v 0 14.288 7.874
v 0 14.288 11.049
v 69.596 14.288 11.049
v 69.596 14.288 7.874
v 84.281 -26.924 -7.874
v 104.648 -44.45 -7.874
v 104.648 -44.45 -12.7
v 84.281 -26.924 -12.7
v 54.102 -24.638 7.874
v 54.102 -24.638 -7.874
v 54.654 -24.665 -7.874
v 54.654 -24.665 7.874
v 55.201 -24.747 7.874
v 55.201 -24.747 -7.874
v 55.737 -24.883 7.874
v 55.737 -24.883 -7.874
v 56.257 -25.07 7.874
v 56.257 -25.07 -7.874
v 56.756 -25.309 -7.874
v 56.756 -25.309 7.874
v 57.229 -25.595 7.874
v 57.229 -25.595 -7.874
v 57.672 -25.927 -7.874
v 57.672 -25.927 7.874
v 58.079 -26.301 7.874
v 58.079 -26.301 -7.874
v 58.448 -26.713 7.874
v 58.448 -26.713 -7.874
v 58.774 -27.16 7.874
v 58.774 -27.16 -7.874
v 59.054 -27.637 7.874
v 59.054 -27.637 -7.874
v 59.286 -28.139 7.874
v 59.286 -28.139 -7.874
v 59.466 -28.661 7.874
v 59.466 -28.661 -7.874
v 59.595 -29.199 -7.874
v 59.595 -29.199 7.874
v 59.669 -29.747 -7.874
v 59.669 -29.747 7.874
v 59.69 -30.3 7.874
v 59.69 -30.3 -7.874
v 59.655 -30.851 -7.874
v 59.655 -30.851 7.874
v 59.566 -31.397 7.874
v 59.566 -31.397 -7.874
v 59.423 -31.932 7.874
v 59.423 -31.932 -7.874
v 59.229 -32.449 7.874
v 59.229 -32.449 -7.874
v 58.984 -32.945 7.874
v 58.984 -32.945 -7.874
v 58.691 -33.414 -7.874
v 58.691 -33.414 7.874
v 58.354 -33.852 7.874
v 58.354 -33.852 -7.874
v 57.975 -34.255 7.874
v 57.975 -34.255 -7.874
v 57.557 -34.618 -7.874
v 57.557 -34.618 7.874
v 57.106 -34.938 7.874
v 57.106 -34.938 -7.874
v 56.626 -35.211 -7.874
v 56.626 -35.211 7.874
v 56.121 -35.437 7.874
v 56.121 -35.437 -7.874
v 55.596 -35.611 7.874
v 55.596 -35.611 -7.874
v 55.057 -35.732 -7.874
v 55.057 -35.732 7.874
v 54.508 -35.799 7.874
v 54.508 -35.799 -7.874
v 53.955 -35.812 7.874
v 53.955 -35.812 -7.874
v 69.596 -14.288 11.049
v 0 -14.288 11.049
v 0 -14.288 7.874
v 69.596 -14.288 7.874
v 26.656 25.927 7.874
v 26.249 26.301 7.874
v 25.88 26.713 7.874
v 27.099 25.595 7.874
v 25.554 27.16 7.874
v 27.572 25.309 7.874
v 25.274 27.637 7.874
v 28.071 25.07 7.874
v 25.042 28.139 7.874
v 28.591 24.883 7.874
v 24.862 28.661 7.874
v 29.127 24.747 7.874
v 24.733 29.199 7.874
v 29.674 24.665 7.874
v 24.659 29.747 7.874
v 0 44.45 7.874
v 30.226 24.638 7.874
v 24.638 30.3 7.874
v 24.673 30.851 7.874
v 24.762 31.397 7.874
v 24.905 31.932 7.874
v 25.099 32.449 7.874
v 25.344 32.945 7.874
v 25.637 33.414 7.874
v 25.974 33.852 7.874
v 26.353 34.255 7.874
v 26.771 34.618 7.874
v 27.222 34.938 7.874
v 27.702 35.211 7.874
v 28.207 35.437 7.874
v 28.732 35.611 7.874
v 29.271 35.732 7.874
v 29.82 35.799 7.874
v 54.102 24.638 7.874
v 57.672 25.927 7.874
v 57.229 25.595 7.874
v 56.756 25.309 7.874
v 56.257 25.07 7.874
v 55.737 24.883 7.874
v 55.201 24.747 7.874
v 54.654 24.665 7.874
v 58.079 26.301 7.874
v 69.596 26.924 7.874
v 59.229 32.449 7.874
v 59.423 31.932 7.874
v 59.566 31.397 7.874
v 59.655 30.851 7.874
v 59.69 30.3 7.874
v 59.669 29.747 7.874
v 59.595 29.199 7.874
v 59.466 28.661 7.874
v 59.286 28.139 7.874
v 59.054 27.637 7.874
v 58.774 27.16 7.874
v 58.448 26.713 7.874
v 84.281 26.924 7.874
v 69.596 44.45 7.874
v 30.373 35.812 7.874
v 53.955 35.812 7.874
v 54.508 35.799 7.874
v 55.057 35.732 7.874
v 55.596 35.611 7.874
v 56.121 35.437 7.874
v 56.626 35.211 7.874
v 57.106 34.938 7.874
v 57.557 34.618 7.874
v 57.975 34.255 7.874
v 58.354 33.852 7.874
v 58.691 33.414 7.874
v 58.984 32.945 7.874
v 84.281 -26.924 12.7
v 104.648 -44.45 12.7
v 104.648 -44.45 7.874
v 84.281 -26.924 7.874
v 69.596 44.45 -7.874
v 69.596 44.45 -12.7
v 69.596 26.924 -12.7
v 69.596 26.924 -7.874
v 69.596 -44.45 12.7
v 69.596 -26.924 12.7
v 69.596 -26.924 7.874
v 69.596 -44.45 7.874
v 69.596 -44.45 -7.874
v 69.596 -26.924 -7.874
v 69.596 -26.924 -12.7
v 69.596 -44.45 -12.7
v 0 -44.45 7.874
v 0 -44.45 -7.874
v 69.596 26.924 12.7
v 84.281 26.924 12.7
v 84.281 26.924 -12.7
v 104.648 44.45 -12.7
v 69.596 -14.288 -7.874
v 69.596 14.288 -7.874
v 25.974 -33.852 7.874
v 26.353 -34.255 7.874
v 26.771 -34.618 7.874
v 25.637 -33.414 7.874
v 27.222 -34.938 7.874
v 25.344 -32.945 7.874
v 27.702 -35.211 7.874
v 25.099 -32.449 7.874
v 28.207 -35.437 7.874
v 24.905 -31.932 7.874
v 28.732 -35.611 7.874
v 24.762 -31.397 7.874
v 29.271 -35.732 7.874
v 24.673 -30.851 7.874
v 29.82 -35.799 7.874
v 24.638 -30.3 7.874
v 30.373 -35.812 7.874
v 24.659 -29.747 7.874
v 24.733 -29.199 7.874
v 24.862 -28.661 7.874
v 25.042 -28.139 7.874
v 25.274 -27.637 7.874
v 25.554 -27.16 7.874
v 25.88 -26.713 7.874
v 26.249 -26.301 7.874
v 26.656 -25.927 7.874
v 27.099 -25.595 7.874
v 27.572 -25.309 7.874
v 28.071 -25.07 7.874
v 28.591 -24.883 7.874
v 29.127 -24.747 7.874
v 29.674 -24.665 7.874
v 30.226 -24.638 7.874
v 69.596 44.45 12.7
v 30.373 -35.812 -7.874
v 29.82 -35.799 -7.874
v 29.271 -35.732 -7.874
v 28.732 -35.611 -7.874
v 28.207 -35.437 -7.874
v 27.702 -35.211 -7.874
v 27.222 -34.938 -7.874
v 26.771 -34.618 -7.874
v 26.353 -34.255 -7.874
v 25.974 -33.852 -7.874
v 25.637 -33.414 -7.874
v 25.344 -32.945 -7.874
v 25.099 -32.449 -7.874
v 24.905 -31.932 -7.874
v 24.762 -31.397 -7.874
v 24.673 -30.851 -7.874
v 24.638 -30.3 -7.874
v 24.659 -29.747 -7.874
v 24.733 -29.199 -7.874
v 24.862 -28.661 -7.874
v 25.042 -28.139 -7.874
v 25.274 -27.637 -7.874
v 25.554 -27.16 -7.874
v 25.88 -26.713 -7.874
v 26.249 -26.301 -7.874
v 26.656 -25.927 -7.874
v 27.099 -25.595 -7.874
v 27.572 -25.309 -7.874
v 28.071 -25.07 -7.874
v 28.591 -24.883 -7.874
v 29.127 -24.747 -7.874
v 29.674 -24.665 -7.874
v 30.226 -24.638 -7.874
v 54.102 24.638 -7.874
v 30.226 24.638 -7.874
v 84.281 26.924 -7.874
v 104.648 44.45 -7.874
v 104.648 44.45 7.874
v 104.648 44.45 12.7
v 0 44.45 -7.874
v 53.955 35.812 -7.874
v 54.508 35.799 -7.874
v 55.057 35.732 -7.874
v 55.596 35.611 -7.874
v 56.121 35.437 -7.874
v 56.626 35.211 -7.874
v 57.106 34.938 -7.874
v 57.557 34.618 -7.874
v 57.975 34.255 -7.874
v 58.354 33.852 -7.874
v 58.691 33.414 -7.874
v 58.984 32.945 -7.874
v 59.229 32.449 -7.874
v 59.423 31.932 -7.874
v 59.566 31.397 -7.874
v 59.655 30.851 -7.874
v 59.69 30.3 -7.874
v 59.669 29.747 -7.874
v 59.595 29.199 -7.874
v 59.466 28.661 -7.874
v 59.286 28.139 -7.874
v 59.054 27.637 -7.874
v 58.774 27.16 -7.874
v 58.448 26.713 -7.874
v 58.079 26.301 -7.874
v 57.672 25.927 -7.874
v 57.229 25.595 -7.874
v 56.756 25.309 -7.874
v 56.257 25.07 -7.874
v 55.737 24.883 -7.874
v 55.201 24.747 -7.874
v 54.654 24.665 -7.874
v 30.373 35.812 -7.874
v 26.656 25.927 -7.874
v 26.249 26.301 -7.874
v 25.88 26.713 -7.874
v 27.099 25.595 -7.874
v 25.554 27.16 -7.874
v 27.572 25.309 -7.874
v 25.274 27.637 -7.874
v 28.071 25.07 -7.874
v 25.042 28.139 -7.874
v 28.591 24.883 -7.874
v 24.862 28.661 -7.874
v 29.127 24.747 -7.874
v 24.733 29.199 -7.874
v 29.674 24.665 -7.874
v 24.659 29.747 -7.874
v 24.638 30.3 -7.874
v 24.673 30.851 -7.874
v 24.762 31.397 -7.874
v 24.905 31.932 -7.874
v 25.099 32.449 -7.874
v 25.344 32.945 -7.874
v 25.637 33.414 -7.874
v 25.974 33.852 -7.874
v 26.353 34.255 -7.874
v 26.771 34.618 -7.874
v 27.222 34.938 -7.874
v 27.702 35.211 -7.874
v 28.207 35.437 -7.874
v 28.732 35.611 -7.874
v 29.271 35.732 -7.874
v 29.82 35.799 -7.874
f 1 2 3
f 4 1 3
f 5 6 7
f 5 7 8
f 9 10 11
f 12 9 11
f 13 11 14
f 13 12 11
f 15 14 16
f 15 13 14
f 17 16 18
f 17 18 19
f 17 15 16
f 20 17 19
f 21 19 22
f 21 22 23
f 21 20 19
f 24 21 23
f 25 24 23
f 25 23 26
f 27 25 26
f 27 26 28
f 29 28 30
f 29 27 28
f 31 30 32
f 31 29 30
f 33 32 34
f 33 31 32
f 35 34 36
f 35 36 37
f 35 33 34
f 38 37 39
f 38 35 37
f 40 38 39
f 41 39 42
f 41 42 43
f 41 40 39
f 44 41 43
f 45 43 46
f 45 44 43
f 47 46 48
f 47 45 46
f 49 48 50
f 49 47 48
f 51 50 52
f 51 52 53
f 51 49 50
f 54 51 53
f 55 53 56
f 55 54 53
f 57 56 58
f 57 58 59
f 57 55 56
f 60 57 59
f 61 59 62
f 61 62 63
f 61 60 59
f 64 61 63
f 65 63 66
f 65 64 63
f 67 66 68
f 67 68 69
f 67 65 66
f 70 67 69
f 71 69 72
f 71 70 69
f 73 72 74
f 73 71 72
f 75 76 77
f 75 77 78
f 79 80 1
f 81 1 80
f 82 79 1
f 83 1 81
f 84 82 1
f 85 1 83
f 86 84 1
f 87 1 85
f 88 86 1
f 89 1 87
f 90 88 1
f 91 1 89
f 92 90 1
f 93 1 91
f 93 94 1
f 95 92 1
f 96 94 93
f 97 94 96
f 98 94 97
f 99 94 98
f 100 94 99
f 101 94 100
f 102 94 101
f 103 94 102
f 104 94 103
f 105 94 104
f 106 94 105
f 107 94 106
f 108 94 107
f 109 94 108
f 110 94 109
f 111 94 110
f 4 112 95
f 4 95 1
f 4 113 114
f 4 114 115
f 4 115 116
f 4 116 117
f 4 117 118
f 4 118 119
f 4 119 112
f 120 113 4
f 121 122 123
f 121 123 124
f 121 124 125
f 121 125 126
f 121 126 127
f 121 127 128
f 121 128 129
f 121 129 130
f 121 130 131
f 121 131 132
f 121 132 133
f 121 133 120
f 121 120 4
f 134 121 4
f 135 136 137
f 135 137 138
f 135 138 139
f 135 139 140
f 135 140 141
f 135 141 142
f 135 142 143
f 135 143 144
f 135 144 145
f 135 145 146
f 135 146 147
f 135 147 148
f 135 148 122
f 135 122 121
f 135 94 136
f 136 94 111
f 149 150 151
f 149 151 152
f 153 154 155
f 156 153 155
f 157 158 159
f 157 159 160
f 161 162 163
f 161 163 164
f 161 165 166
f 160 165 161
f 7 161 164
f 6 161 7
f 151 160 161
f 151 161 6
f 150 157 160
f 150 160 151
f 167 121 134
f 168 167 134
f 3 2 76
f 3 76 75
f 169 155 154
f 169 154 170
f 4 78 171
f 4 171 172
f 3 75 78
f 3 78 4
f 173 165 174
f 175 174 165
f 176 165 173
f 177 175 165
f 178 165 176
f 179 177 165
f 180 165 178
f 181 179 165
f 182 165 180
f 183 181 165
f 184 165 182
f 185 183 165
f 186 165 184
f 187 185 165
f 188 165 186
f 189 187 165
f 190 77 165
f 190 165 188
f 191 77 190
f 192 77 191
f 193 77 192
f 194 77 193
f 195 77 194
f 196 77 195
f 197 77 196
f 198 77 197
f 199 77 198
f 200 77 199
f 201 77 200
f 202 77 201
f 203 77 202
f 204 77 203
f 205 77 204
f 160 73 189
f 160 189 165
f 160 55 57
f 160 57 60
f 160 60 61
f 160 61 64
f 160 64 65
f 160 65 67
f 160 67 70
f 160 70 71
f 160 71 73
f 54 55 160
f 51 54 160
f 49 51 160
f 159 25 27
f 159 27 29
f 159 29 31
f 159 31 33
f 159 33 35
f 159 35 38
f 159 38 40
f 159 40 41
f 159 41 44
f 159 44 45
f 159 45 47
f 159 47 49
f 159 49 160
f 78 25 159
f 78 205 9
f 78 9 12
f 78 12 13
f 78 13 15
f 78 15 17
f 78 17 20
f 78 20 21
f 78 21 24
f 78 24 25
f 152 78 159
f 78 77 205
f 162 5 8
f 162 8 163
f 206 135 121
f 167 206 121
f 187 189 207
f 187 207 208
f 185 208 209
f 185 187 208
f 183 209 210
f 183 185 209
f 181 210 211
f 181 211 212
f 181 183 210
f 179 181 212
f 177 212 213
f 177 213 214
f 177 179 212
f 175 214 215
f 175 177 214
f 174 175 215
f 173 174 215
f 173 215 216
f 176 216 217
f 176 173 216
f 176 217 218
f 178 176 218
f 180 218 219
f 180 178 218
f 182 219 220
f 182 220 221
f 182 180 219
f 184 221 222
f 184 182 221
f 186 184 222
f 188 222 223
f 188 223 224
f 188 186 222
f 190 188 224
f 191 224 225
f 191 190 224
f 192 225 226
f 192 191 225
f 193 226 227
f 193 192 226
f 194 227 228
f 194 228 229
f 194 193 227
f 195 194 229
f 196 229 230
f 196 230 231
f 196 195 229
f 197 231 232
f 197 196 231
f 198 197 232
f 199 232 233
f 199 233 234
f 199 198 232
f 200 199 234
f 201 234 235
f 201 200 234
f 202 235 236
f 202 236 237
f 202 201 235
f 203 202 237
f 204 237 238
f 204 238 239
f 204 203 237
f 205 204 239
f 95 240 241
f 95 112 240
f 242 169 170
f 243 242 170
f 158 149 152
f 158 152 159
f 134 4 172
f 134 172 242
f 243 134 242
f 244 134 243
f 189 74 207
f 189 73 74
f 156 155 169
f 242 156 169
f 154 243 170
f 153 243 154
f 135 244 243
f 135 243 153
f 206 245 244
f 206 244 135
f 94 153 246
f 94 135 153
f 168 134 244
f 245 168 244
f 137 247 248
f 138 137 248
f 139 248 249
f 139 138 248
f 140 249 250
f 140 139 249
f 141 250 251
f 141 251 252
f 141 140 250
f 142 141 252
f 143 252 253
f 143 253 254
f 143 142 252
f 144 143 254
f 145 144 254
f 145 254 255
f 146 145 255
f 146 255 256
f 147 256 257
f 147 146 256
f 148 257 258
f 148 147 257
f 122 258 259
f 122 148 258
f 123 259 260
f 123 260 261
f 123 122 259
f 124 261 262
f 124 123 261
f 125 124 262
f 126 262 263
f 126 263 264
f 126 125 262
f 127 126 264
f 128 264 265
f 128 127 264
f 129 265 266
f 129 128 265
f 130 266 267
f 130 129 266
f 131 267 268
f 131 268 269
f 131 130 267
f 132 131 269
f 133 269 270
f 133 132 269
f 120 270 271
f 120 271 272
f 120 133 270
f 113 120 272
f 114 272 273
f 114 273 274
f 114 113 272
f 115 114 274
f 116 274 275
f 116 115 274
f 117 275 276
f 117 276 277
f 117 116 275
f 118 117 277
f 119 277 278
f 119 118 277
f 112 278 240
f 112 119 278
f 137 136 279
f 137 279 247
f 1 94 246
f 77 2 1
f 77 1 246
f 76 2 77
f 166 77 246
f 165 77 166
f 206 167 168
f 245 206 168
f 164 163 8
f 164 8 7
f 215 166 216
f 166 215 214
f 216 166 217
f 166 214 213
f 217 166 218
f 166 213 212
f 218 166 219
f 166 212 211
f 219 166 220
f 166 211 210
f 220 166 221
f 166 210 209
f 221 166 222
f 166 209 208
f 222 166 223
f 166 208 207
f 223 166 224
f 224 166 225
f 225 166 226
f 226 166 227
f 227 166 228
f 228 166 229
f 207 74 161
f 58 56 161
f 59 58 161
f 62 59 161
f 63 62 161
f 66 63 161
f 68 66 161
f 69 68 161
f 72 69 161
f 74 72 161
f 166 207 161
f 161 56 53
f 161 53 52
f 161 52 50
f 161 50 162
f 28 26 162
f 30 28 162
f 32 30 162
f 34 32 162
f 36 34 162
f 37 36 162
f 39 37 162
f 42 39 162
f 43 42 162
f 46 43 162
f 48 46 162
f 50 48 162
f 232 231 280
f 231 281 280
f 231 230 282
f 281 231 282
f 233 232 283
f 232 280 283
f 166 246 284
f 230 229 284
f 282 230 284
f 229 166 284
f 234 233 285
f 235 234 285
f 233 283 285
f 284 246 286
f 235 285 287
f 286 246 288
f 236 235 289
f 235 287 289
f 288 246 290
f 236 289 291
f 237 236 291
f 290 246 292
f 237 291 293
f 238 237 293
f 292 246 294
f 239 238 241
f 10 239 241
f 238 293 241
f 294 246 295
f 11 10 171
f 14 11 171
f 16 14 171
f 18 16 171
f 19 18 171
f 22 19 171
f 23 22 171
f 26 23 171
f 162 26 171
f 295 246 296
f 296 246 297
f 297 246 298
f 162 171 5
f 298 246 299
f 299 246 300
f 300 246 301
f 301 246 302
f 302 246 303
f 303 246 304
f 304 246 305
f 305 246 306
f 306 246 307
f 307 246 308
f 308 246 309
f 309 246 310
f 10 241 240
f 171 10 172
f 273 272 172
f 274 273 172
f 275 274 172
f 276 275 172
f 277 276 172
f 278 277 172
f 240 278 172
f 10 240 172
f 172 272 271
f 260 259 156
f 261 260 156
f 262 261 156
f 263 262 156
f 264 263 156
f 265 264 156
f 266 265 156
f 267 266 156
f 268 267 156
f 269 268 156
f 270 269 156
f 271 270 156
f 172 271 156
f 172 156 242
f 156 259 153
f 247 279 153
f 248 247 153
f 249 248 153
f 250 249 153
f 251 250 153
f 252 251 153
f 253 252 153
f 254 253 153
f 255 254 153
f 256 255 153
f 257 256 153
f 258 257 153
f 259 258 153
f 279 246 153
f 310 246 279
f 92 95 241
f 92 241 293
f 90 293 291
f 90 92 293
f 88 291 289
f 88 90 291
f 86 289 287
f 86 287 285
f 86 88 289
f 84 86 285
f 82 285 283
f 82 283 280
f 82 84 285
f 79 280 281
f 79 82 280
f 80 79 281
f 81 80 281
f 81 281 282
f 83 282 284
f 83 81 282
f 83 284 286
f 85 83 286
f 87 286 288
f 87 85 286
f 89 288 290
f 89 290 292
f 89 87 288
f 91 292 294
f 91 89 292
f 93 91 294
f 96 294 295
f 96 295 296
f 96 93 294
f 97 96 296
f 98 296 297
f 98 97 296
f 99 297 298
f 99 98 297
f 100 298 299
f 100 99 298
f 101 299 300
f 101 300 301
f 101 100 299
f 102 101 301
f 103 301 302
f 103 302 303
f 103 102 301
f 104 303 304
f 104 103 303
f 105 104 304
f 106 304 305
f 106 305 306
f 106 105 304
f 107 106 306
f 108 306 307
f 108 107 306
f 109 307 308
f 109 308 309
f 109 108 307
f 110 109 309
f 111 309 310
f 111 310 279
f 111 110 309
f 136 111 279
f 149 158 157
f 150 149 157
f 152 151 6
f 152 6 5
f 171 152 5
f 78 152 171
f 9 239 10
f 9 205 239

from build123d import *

# Parameters (mm, degrees)
F0_W     = 6.35
F0_H     = 30.1625
F1_DEPTH = 7.874
F2_W     = 69.596
F2_H     = 28.575
F3_DEPTH = 3.175
F5_DEPTH = 12.7


with BuildPart() as f1:
    # F0 (on Top) → F1 (new body, symmetric)
    with BuildSketch(Plane.XY):
        with Locations((3.175, 29.36875)):
            Rectangle(F0_W, F0_H)
        Polygon((6.35, 14.2875), (0, 14.2875), (0, -14.2875), (6.35, -14.2875), (69.596, -14.2875), (69.596, 14.2875), align=None)
        Polygon((104.648, 44.45), (6.35, 44.45), (6.35, 14.2875), (69.596, 14.2875), align=None)
        with BuildLine():
            ThreePointArc((30.226, 24.638), (24.638484, 30.299565), (30.373118, 35.812063))
            Line((30.373118, 35.812063), (53.954882, 35.812063))
            ThreePointArc((53.954882, 35.812063), (59.689516, 30.299565), (54.102, 24.638))
            Line((54.102, 24.638), (30.226, 24.638))
        make_face(mode=Mode.SUBTRACT)
        with Locations((3.175, -29.36875)):
            Rectangle(F0_W, F0_H)
        Polygon((69.596, -14.2875), (6.35, -14.2875), (6.35, -44.45), (104.648, -44.45), align=None)
        with BuildLine():
            ThreePointArc((30.373118, -35.812063), (24.638484, -30.299565), (30.226, -24.638))
            Line((30.226, -24.638), (54.102, -24.638))
            ThreePointArc((54.102, -24.638), (59.689516, -30.299565), (53.954882, -35.812063))
            Line((53.954882, -35.812063), (30.373118, -35.812063))
        make_face(mode=Mode.SUBTRACT)
    extrude(amount=F1_DEPTH, both=True)

    # F2 (on face) → F3 (join, symmetric)
    with BuildSketch(Plane.XY.offset(7.874)):
        with Locations((34.798, 0)):
            Rectangle(F2_W, F2_H)
    extrude(amount=F3_DEPTH, both=True)

    # F4 (on Top) → F5 (join, symmetric)
    with BuildSketch(Plane.XY):
        Polygon((104.648, 44.45), (69.596, 44.45), (69.596, 26.924), (84.280943, 26.924), align=None)
        Polygon((84.280943, -26.924), (69.596, -26.924), (69.596, -44.45), (104.648, -44.45), align=None)
    extrude(amount=F5_DEPTH, both=True)


solid = f1.part
